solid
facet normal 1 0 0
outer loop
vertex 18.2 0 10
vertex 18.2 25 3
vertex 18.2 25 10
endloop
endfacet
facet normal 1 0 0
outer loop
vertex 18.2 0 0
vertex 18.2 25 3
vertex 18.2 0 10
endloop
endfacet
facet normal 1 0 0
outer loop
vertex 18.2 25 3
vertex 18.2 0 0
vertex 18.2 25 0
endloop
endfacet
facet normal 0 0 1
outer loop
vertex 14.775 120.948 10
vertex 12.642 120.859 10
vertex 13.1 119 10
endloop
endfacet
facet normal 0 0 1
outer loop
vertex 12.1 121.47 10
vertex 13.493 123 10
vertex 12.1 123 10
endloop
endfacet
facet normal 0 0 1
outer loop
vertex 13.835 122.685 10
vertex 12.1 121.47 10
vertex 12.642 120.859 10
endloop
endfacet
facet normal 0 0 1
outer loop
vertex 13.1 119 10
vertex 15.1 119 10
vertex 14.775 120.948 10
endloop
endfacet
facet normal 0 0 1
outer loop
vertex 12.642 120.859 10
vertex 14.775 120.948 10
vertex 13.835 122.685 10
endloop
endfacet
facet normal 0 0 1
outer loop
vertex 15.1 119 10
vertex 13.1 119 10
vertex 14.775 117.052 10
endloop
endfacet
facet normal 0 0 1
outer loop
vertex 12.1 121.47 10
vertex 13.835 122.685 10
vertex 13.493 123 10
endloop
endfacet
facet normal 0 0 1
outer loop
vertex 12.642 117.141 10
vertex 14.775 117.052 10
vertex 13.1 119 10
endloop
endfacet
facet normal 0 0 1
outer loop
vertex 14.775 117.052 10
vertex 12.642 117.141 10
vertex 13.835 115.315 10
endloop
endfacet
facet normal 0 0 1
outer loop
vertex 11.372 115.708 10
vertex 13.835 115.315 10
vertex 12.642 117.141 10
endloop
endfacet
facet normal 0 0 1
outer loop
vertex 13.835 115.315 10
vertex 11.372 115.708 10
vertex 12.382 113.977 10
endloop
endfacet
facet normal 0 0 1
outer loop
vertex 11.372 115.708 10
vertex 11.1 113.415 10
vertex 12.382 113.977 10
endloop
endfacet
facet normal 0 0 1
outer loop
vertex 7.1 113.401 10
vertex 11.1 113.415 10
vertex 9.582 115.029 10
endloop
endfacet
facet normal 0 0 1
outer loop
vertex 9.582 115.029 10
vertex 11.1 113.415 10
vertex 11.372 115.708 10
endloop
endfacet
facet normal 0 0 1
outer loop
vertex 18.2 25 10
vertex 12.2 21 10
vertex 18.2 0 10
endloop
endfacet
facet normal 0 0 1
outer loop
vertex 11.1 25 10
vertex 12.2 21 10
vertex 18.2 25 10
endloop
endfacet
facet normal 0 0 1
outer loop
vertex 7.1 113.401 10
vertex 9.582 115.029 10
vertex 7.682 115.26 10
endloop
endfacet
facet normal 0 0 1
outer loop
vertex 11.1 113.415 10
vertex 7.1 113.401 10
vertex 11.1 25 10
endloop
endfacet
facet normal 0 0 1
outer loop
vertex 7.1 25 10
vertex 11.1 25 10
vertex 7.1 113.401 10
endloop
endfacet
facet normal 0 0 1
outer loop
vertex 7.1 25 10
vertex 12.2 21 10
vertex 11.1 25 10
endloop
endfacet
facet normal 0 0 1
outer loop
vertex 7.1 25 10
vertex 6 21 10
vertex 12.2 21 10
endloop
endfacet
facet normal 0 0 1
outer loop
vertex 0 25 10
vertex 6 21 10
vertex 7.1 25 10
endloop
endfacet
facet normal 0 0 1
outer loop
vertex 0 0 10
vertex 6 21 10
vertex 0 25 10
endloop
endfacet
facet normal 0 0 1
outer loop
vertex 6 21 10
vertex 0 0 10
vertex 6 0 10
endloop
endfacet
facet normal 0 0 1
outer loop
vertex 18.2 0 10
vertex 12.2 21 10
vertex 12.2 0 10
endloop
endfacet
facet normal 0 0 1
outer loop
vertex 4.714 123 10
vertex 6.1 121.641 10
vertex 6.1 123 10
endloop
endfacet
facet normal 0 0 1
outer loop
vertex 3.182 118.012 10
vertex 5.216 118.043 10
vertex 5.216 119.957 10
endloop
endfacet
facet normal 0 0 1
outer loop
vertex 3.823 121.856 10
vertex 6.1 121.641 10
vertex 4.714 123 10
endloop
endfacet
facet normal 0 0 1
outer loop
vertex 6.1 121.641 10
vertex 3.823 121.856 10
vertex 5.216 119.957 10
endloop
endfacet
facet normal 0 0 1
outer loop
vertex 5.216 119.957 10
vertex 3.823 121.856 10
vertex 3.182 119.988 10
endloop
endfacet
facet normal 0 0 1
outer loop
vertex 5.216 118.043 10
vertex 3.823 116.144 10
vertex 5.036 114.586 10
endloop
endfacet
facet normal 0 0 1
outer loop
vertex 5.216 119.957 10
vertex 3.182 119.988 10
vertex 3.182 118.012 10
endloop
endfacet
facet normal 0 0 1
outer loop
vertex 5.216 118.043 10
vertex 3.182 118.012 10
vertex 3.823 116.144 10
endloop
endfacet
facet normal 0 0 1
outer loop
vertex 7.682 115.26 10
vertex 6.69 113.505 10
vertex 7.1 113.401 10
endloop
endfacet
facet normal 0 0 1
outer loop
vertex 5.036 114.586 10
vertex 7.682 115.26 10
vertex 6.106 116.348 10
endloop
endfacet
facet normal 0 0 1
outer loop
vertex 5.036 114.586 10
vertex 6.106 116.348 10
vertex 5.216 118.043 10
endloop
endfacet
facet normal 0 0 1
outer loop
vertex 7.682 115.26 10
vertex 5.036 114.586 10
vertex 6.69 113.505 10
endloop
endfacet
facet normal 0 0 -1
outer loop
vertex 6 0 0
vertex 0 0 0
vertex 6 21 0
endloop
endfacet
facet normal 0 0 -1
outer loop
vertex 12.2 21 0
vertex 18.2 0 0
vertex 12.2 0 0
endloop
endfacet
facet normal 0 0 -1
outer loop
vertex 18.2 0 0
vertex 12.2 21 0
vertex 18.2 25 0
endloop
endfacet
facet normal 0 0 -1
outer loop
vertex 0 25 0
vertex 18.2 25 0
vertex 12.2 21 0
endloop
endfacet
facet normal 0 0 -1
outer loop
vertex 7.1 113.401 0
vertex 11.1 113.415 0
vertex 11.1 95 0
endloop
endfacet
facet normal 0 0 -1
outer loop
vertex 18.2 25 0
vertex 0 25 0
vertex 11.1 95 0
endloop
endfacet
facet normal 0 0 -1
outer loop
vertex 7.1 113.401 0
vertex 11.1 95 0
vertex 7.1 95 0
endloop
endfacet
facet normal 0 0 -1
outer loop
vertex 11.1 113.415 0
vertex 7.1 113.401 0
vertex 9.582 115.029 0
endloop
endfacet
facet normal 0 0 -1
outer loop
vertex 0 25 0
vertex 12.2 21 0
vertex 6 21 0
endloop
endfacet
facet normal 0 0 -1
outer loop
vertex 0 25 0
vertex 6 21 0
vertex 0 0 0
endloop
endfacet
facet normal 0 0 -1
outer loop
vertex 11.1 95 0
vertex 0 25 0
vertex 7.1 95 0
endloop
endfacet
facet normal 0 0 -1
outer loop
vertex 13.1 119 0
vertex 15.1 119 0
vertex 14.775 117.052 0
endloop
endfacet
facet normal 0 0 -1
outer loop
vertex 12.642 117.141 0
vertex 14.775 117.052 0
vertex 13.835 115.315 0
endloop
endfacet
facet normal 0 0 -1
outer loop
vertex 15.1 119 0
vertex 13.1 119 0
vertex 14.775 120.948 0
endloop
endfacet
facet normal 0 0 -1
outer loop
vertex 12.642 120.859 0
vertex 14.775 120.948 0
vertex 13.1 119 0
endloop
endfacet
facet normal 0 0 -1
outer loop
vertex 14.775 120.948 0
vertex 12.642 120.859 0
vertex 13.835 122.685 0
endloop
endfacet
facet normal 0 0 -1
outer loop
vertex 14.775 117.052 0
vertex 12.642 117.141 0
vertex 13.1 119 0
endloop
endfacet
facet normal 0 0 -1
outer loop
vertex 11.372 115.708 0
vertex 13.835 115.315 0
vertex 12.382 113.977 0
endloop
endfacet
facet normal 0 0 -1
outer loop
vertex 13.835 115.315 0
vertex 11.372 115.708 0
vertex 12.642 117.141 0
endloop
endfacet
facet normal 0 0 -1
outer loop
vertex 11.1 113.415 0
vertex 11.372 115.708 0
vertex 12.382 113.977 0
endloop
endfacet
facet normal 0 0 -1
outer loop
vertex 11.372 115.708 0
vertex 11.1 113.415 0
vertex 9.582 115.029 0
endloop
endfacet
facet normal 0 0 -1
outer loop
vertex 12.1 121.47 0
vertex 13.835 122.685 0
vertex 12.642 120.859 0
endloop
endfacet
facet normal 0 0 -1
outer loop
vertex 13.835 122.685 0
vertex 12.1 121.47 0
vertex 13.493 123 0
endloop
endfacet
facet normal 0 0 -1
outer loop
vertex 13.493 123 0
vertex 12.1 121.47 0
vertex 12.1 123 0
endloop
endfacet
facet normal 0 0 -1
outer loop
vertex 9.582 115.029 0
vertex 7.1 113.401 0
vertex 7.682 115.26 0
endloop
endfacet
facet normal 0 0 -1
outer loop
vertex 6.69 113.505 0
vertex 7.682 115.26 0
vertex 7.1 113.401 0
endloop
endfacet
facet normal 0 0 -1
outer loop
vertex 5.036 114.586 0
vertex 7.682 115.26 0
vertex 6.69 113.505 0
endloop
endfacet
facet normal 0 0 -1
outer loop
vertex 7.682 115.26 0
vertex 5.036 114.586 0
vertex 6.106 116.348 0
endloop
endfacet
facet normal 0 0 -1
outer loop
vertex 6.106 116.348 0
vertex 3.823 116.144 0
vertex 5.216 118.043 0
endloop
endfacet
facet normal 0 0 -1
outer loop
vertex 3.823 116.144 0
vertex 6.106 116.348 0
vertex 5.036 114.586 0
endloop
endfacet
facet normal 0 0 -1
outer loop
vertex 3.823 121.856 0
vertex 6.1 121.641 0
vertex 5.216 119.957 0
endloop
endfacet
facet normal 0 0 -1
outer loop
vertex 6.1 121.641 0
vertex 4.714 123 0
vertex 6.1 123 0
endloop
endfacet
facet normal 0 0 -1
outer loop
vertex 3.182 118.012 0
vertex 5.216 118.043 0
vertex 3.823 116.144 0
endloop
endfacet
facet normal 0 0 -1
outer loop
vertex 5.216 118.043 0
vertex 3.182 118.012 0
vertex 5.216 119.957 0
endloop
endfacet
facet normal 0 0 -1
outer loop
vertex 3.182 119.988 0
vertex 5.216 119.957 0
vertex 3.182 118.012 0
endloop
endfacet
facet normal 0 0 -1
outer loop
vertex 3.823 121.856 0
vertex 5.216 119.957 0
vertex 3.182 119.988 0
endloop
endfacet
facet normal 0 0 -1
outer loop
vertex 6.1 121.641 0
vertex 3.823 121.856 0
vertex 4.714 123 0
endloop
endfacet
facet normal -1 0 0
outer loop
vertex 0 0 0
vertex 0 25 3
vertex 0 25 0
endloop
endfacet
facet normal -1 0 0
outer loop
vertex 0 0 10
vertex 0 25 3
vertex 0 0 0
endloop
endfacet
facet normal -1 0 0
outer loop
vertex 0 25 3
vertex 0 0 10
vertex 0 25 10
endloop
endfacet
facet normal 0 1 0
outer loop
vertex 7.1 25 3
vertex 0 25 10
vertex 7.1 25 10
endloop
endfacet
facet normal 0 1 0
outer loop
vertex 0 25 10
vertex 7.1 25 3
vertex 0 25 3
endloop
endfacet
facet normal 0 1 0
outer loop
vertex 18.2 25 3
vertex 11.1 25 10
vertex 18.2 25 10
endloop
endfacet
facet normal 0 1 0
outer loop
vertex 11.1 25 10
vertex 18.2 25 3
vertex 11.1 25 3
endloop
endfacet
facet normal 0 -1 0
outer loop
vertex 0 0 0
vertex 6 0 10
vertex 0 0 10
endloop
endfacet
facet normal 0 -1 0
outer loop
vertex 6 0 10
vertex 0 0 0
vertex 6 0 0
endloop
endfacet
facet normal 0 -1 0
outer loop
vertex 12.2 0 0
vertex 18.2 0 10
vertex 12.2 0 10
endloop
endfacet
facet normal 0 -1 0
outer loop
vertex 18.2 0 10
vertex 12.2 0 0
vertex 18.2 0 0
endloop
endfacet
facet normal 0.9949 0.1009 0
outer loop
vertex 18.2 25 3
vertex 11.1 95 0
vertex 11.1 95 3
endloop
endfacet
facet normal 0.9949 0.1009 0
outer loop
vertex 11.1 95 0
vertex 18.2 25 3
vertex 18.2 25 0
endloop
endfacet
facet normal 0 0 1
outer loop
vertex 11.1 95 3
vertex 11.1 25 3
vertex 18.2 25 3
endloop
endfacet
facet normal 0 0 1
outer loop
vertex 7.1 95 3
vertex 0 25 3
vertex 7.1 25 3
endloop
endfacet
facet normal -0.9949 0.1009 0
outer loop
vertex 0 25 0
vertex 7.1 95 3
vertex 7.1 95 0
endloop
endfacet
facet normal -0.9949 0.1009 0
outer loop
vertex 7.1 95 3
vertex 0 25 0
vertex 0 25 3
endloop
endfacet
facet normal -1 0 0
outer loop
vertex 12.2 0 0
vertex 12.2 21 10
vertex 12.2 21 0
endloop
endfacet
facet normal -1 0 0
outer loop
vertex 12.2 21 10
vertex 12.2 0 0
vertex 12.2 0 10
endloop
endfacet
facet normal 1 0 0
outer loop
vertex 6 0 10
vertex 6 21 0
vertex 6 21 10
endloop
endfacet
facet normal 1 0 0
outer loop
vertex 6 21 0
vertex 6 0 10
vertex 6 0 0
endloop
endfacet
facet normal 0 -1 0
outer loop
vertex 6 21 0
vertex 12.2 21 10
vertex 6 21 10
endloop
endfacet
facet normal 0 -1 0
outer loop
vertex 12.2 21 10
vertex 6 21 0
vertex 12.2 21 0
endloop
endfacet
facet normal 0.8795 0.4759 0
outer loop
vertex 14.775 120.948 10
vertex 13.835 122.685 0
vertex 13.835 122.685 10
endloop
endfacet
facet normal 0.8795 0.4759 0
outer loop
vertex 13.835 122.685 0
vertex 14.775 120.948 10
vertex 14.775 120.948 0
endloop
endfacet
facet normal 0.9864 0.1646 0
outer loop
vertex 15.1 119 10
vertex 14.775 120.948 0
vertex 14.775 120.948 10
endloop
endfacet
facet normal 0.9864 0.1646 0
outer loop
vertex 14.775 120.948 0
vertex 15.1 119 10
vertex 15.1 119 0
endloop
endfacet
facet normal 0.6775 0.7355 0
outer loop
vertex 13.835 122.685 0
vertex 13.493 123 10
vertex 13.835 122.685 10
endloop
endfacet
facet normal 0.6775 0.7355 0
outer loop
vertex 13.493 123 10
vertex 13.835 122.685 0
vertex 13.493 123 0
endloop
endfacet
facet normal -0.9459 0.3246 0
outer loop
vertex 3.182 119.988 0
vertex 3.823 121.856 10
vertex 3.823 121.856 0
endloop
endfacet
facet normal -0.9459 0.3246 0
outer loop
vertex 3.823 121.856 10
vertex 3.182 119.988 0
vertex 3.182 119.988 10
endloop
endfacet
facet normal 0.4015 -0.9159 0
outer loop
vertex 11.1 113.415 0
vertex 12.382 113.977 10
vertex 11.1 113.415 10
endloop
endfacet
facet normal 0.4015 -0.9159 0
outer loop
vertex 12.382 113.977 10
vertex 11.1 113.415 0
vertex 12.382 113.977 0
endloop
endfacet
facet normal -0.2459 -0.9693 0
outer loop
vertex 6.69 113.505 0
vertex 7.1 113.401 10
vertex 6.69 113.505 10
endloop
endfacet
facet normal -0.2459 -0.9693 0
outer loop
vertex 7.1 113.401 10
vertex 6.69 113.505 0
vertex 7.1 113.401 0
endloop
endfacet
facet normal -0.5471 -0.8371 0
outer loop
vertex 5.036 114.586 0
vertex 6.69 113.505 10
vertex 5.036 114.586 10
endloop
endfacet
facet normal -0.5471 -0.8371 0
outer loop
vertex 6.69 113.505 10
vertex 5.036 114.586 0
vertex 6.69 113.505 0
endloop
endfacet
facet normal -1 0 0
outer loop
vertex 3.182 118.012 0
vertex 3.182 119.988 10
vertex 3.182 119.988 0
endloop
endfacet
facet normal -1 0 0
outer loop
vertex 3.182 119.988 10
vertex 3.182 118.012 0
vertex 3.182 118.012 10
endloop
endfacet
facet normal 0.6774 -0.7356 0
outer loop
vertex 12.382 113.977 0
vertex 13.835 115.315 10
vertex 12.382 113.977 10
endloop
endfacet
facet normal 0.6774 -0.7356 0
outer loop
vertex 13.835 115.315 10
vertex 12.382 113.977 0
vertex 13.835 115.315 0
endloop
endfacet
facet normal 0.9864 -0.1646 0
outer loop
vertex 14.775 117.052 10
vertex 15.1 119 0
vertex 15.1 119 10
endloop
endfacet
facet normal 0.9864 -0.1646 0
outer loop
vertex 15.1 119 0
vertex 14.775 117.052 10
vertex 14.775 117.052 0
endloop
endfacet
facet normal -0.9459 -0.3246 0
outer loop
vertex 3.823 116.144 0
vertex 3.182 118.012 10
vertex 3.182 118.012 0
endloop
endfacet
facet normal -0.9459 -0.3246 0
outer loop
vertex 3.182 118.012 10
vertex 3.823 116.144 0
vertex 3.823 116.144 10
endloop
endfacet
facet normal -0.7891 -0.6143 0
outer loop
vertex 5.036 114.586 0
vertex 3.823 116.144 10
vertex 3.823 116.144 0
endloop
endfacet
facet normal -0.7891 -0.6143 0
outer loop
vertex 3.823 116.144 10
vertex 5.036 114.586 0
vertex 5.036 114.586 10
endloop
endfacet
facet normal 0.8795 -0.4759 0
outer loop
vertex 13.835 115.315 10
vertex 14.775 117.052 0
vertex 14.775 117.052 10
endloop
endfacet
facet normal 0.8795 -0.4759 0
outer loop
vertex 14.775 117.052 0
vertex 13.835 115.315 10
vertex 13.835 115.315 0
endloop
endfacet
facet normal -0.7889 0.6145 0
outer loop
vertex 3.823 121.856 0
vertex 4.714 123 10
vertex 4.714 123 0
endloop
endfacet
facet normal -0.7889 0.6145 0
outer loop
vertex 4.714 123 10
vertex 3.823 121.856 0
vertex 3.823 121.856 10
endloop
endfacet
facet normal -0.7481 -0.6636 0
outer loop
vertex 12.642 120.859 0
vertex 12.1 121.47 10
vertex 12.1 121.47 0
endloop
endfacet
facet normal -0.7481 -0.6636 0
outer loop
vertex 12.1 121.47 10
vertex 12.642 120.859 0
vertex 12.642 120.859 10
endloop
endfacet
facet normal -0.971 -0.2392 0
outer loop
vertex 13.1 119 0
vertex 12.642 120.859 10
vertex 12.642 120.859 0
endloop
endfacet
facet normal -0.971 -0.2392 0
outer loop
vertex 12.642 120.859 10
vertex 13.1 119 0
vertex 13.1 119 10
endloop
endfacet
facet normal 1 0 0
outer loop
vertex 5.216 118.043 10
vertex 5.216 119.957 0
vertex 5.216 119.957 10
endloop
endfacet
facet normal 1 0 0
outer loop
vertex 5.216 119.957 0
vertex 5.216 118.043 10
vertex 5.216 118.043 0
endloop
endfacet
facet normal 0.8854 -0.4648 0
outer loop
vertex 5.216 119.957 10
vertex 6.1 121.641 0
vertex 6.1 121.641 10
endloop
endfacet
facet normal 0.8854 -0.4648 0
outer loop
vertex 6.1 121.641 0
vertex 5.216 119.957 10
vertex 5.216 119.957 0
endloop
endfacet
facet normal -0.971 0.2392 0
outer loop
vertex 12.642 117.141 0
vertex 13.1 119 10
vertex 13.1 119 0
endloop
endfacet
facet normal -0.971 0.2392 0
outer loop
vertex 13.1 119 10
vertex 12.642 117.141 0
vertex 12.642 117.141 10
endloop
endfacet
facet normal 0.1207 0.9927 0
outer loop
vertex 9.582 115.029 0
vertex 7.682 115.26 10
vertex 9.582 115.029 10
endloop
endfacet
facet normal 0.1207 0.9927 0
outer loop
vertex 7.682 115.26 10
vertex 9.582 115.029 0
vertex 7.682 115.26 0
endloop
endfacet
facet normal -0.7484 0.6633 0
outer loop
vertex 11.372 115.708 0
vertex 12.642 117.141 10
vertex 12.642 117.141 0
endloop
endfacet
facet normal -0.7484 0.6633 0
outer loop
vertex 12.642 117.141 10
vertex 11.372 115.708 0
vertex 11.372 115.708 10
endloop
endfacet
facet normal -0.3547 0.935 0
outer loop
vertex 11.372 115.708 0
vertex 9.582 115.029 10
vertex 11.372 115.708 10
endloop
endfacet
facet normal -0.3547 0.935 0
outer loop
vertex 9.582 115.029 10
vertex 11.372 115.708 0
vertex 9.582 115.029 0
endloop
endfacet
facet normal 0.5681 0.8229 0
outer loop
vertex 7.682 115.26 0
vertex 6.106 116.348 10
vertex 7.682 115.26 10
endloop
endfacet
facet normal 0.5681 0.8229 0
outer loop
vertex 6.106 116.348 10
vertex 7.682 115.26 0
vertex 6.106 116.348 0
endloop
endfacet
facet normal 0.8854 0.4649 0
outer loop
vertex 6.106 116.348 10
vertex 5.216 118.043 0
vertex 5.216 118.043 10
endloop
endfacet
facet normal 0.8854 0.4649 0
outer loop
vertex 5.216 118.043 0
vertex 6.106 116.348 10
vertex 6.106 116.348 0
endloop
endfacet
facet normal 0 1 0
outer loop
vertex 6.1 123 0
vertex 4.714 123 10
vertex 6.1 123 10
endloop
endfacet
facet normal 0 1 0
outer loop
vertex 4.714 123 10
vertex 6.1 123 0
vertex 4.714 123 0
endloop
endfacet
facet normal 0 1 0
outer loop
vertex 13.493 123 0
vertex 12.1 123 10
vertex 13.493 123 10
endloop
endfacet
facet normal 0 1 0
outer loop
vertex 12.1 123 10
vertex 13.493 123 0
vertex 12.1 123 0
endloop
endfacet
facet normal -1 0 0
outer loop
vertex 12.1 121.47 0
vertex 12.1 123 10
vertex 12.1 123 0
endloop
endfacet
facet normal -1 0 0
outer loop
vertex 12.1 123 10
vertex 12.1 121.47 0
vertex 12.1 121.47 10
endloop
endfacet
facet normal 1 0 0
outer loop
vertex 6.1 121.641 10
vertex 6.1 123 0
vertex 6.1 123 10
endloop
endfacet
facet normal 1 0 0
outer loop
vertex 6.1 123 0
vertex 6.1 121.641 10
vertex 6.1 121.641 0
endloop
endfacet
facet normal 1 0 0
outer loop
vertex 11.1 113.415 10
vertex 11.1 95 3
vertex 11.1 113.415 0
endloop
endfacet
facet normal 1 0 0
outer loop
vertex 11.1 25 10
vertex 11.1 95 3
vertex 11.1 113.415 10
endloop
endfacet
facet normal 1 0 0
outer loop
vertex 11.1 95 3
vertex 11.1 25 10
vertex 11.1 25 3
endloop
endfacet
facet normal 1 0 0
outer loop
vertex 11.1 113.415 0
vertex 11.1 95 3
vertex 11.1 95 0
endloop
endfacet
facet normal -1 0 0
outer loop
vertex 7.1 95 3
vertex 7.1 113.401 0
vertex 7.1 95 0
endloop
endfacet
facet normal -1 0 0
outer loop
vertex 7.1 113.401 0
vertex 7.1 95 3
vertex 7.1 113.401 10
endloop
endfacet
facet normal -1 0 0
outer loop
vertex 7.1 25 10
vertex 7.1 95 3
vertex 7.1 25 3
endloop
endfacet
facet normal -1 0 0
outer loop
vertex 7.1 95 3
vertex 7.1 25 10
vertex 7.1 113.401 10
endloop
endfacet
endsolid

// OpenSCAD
// spool holder for the Prusa i3
// designed by EiNSTeiN_ <einstein@g3nius.org>

clip_width = 10;
clip_thickness = 6;
clip_height = 25;
plate_thickness = 6.2;
beam_thickness = 4;
beam_height = 90;
beam_width = clip_thickness*2+plate_thickness;
bar_diameter = 8;
bar_outer_diameter = bar_diameter+4;
cross_thickness = 3;

module spool_holder() {
difference() {
	union() {
		cube([beam_width, clip_height, clip_width]);
		hull() {	
			cube([beam_width, clip_height, cross_thickness]);
			translate([beam_width/2-beam_thickness/2, clip_height, 0]) cube([beam_thickness, beam_height-20, cross_thickness]);
		}
	}
	translate([clip_thickness, 0,0]) cube([plate_thickness, clip_height-4, clip_width]);
}

translate([beam_width/2-beam_thickness/2, clip_height, 0]) cube([beam_thickness, beam_height, clip_width]);

translate([beam_width/2, clip_height+beam_height+bar_outer_diameter/2-2, 0]) 
difference() {
	cylinder(r=bar_outer_diameter/2, h=clip_width);
	cylinder(r=bar_diameter/2, h=clip_width);
	translate([-bar_outer_diameter/2, 4,0]) cube([bar_outer_diameter, bar_outer_diameter/2, clip_width]);
	translate([-bar_diameter/2+2/2, 0,0]) cube([bar_diameter-2, bar_outer_diameter/2, clip_width]);
}
}
spool_holder();
